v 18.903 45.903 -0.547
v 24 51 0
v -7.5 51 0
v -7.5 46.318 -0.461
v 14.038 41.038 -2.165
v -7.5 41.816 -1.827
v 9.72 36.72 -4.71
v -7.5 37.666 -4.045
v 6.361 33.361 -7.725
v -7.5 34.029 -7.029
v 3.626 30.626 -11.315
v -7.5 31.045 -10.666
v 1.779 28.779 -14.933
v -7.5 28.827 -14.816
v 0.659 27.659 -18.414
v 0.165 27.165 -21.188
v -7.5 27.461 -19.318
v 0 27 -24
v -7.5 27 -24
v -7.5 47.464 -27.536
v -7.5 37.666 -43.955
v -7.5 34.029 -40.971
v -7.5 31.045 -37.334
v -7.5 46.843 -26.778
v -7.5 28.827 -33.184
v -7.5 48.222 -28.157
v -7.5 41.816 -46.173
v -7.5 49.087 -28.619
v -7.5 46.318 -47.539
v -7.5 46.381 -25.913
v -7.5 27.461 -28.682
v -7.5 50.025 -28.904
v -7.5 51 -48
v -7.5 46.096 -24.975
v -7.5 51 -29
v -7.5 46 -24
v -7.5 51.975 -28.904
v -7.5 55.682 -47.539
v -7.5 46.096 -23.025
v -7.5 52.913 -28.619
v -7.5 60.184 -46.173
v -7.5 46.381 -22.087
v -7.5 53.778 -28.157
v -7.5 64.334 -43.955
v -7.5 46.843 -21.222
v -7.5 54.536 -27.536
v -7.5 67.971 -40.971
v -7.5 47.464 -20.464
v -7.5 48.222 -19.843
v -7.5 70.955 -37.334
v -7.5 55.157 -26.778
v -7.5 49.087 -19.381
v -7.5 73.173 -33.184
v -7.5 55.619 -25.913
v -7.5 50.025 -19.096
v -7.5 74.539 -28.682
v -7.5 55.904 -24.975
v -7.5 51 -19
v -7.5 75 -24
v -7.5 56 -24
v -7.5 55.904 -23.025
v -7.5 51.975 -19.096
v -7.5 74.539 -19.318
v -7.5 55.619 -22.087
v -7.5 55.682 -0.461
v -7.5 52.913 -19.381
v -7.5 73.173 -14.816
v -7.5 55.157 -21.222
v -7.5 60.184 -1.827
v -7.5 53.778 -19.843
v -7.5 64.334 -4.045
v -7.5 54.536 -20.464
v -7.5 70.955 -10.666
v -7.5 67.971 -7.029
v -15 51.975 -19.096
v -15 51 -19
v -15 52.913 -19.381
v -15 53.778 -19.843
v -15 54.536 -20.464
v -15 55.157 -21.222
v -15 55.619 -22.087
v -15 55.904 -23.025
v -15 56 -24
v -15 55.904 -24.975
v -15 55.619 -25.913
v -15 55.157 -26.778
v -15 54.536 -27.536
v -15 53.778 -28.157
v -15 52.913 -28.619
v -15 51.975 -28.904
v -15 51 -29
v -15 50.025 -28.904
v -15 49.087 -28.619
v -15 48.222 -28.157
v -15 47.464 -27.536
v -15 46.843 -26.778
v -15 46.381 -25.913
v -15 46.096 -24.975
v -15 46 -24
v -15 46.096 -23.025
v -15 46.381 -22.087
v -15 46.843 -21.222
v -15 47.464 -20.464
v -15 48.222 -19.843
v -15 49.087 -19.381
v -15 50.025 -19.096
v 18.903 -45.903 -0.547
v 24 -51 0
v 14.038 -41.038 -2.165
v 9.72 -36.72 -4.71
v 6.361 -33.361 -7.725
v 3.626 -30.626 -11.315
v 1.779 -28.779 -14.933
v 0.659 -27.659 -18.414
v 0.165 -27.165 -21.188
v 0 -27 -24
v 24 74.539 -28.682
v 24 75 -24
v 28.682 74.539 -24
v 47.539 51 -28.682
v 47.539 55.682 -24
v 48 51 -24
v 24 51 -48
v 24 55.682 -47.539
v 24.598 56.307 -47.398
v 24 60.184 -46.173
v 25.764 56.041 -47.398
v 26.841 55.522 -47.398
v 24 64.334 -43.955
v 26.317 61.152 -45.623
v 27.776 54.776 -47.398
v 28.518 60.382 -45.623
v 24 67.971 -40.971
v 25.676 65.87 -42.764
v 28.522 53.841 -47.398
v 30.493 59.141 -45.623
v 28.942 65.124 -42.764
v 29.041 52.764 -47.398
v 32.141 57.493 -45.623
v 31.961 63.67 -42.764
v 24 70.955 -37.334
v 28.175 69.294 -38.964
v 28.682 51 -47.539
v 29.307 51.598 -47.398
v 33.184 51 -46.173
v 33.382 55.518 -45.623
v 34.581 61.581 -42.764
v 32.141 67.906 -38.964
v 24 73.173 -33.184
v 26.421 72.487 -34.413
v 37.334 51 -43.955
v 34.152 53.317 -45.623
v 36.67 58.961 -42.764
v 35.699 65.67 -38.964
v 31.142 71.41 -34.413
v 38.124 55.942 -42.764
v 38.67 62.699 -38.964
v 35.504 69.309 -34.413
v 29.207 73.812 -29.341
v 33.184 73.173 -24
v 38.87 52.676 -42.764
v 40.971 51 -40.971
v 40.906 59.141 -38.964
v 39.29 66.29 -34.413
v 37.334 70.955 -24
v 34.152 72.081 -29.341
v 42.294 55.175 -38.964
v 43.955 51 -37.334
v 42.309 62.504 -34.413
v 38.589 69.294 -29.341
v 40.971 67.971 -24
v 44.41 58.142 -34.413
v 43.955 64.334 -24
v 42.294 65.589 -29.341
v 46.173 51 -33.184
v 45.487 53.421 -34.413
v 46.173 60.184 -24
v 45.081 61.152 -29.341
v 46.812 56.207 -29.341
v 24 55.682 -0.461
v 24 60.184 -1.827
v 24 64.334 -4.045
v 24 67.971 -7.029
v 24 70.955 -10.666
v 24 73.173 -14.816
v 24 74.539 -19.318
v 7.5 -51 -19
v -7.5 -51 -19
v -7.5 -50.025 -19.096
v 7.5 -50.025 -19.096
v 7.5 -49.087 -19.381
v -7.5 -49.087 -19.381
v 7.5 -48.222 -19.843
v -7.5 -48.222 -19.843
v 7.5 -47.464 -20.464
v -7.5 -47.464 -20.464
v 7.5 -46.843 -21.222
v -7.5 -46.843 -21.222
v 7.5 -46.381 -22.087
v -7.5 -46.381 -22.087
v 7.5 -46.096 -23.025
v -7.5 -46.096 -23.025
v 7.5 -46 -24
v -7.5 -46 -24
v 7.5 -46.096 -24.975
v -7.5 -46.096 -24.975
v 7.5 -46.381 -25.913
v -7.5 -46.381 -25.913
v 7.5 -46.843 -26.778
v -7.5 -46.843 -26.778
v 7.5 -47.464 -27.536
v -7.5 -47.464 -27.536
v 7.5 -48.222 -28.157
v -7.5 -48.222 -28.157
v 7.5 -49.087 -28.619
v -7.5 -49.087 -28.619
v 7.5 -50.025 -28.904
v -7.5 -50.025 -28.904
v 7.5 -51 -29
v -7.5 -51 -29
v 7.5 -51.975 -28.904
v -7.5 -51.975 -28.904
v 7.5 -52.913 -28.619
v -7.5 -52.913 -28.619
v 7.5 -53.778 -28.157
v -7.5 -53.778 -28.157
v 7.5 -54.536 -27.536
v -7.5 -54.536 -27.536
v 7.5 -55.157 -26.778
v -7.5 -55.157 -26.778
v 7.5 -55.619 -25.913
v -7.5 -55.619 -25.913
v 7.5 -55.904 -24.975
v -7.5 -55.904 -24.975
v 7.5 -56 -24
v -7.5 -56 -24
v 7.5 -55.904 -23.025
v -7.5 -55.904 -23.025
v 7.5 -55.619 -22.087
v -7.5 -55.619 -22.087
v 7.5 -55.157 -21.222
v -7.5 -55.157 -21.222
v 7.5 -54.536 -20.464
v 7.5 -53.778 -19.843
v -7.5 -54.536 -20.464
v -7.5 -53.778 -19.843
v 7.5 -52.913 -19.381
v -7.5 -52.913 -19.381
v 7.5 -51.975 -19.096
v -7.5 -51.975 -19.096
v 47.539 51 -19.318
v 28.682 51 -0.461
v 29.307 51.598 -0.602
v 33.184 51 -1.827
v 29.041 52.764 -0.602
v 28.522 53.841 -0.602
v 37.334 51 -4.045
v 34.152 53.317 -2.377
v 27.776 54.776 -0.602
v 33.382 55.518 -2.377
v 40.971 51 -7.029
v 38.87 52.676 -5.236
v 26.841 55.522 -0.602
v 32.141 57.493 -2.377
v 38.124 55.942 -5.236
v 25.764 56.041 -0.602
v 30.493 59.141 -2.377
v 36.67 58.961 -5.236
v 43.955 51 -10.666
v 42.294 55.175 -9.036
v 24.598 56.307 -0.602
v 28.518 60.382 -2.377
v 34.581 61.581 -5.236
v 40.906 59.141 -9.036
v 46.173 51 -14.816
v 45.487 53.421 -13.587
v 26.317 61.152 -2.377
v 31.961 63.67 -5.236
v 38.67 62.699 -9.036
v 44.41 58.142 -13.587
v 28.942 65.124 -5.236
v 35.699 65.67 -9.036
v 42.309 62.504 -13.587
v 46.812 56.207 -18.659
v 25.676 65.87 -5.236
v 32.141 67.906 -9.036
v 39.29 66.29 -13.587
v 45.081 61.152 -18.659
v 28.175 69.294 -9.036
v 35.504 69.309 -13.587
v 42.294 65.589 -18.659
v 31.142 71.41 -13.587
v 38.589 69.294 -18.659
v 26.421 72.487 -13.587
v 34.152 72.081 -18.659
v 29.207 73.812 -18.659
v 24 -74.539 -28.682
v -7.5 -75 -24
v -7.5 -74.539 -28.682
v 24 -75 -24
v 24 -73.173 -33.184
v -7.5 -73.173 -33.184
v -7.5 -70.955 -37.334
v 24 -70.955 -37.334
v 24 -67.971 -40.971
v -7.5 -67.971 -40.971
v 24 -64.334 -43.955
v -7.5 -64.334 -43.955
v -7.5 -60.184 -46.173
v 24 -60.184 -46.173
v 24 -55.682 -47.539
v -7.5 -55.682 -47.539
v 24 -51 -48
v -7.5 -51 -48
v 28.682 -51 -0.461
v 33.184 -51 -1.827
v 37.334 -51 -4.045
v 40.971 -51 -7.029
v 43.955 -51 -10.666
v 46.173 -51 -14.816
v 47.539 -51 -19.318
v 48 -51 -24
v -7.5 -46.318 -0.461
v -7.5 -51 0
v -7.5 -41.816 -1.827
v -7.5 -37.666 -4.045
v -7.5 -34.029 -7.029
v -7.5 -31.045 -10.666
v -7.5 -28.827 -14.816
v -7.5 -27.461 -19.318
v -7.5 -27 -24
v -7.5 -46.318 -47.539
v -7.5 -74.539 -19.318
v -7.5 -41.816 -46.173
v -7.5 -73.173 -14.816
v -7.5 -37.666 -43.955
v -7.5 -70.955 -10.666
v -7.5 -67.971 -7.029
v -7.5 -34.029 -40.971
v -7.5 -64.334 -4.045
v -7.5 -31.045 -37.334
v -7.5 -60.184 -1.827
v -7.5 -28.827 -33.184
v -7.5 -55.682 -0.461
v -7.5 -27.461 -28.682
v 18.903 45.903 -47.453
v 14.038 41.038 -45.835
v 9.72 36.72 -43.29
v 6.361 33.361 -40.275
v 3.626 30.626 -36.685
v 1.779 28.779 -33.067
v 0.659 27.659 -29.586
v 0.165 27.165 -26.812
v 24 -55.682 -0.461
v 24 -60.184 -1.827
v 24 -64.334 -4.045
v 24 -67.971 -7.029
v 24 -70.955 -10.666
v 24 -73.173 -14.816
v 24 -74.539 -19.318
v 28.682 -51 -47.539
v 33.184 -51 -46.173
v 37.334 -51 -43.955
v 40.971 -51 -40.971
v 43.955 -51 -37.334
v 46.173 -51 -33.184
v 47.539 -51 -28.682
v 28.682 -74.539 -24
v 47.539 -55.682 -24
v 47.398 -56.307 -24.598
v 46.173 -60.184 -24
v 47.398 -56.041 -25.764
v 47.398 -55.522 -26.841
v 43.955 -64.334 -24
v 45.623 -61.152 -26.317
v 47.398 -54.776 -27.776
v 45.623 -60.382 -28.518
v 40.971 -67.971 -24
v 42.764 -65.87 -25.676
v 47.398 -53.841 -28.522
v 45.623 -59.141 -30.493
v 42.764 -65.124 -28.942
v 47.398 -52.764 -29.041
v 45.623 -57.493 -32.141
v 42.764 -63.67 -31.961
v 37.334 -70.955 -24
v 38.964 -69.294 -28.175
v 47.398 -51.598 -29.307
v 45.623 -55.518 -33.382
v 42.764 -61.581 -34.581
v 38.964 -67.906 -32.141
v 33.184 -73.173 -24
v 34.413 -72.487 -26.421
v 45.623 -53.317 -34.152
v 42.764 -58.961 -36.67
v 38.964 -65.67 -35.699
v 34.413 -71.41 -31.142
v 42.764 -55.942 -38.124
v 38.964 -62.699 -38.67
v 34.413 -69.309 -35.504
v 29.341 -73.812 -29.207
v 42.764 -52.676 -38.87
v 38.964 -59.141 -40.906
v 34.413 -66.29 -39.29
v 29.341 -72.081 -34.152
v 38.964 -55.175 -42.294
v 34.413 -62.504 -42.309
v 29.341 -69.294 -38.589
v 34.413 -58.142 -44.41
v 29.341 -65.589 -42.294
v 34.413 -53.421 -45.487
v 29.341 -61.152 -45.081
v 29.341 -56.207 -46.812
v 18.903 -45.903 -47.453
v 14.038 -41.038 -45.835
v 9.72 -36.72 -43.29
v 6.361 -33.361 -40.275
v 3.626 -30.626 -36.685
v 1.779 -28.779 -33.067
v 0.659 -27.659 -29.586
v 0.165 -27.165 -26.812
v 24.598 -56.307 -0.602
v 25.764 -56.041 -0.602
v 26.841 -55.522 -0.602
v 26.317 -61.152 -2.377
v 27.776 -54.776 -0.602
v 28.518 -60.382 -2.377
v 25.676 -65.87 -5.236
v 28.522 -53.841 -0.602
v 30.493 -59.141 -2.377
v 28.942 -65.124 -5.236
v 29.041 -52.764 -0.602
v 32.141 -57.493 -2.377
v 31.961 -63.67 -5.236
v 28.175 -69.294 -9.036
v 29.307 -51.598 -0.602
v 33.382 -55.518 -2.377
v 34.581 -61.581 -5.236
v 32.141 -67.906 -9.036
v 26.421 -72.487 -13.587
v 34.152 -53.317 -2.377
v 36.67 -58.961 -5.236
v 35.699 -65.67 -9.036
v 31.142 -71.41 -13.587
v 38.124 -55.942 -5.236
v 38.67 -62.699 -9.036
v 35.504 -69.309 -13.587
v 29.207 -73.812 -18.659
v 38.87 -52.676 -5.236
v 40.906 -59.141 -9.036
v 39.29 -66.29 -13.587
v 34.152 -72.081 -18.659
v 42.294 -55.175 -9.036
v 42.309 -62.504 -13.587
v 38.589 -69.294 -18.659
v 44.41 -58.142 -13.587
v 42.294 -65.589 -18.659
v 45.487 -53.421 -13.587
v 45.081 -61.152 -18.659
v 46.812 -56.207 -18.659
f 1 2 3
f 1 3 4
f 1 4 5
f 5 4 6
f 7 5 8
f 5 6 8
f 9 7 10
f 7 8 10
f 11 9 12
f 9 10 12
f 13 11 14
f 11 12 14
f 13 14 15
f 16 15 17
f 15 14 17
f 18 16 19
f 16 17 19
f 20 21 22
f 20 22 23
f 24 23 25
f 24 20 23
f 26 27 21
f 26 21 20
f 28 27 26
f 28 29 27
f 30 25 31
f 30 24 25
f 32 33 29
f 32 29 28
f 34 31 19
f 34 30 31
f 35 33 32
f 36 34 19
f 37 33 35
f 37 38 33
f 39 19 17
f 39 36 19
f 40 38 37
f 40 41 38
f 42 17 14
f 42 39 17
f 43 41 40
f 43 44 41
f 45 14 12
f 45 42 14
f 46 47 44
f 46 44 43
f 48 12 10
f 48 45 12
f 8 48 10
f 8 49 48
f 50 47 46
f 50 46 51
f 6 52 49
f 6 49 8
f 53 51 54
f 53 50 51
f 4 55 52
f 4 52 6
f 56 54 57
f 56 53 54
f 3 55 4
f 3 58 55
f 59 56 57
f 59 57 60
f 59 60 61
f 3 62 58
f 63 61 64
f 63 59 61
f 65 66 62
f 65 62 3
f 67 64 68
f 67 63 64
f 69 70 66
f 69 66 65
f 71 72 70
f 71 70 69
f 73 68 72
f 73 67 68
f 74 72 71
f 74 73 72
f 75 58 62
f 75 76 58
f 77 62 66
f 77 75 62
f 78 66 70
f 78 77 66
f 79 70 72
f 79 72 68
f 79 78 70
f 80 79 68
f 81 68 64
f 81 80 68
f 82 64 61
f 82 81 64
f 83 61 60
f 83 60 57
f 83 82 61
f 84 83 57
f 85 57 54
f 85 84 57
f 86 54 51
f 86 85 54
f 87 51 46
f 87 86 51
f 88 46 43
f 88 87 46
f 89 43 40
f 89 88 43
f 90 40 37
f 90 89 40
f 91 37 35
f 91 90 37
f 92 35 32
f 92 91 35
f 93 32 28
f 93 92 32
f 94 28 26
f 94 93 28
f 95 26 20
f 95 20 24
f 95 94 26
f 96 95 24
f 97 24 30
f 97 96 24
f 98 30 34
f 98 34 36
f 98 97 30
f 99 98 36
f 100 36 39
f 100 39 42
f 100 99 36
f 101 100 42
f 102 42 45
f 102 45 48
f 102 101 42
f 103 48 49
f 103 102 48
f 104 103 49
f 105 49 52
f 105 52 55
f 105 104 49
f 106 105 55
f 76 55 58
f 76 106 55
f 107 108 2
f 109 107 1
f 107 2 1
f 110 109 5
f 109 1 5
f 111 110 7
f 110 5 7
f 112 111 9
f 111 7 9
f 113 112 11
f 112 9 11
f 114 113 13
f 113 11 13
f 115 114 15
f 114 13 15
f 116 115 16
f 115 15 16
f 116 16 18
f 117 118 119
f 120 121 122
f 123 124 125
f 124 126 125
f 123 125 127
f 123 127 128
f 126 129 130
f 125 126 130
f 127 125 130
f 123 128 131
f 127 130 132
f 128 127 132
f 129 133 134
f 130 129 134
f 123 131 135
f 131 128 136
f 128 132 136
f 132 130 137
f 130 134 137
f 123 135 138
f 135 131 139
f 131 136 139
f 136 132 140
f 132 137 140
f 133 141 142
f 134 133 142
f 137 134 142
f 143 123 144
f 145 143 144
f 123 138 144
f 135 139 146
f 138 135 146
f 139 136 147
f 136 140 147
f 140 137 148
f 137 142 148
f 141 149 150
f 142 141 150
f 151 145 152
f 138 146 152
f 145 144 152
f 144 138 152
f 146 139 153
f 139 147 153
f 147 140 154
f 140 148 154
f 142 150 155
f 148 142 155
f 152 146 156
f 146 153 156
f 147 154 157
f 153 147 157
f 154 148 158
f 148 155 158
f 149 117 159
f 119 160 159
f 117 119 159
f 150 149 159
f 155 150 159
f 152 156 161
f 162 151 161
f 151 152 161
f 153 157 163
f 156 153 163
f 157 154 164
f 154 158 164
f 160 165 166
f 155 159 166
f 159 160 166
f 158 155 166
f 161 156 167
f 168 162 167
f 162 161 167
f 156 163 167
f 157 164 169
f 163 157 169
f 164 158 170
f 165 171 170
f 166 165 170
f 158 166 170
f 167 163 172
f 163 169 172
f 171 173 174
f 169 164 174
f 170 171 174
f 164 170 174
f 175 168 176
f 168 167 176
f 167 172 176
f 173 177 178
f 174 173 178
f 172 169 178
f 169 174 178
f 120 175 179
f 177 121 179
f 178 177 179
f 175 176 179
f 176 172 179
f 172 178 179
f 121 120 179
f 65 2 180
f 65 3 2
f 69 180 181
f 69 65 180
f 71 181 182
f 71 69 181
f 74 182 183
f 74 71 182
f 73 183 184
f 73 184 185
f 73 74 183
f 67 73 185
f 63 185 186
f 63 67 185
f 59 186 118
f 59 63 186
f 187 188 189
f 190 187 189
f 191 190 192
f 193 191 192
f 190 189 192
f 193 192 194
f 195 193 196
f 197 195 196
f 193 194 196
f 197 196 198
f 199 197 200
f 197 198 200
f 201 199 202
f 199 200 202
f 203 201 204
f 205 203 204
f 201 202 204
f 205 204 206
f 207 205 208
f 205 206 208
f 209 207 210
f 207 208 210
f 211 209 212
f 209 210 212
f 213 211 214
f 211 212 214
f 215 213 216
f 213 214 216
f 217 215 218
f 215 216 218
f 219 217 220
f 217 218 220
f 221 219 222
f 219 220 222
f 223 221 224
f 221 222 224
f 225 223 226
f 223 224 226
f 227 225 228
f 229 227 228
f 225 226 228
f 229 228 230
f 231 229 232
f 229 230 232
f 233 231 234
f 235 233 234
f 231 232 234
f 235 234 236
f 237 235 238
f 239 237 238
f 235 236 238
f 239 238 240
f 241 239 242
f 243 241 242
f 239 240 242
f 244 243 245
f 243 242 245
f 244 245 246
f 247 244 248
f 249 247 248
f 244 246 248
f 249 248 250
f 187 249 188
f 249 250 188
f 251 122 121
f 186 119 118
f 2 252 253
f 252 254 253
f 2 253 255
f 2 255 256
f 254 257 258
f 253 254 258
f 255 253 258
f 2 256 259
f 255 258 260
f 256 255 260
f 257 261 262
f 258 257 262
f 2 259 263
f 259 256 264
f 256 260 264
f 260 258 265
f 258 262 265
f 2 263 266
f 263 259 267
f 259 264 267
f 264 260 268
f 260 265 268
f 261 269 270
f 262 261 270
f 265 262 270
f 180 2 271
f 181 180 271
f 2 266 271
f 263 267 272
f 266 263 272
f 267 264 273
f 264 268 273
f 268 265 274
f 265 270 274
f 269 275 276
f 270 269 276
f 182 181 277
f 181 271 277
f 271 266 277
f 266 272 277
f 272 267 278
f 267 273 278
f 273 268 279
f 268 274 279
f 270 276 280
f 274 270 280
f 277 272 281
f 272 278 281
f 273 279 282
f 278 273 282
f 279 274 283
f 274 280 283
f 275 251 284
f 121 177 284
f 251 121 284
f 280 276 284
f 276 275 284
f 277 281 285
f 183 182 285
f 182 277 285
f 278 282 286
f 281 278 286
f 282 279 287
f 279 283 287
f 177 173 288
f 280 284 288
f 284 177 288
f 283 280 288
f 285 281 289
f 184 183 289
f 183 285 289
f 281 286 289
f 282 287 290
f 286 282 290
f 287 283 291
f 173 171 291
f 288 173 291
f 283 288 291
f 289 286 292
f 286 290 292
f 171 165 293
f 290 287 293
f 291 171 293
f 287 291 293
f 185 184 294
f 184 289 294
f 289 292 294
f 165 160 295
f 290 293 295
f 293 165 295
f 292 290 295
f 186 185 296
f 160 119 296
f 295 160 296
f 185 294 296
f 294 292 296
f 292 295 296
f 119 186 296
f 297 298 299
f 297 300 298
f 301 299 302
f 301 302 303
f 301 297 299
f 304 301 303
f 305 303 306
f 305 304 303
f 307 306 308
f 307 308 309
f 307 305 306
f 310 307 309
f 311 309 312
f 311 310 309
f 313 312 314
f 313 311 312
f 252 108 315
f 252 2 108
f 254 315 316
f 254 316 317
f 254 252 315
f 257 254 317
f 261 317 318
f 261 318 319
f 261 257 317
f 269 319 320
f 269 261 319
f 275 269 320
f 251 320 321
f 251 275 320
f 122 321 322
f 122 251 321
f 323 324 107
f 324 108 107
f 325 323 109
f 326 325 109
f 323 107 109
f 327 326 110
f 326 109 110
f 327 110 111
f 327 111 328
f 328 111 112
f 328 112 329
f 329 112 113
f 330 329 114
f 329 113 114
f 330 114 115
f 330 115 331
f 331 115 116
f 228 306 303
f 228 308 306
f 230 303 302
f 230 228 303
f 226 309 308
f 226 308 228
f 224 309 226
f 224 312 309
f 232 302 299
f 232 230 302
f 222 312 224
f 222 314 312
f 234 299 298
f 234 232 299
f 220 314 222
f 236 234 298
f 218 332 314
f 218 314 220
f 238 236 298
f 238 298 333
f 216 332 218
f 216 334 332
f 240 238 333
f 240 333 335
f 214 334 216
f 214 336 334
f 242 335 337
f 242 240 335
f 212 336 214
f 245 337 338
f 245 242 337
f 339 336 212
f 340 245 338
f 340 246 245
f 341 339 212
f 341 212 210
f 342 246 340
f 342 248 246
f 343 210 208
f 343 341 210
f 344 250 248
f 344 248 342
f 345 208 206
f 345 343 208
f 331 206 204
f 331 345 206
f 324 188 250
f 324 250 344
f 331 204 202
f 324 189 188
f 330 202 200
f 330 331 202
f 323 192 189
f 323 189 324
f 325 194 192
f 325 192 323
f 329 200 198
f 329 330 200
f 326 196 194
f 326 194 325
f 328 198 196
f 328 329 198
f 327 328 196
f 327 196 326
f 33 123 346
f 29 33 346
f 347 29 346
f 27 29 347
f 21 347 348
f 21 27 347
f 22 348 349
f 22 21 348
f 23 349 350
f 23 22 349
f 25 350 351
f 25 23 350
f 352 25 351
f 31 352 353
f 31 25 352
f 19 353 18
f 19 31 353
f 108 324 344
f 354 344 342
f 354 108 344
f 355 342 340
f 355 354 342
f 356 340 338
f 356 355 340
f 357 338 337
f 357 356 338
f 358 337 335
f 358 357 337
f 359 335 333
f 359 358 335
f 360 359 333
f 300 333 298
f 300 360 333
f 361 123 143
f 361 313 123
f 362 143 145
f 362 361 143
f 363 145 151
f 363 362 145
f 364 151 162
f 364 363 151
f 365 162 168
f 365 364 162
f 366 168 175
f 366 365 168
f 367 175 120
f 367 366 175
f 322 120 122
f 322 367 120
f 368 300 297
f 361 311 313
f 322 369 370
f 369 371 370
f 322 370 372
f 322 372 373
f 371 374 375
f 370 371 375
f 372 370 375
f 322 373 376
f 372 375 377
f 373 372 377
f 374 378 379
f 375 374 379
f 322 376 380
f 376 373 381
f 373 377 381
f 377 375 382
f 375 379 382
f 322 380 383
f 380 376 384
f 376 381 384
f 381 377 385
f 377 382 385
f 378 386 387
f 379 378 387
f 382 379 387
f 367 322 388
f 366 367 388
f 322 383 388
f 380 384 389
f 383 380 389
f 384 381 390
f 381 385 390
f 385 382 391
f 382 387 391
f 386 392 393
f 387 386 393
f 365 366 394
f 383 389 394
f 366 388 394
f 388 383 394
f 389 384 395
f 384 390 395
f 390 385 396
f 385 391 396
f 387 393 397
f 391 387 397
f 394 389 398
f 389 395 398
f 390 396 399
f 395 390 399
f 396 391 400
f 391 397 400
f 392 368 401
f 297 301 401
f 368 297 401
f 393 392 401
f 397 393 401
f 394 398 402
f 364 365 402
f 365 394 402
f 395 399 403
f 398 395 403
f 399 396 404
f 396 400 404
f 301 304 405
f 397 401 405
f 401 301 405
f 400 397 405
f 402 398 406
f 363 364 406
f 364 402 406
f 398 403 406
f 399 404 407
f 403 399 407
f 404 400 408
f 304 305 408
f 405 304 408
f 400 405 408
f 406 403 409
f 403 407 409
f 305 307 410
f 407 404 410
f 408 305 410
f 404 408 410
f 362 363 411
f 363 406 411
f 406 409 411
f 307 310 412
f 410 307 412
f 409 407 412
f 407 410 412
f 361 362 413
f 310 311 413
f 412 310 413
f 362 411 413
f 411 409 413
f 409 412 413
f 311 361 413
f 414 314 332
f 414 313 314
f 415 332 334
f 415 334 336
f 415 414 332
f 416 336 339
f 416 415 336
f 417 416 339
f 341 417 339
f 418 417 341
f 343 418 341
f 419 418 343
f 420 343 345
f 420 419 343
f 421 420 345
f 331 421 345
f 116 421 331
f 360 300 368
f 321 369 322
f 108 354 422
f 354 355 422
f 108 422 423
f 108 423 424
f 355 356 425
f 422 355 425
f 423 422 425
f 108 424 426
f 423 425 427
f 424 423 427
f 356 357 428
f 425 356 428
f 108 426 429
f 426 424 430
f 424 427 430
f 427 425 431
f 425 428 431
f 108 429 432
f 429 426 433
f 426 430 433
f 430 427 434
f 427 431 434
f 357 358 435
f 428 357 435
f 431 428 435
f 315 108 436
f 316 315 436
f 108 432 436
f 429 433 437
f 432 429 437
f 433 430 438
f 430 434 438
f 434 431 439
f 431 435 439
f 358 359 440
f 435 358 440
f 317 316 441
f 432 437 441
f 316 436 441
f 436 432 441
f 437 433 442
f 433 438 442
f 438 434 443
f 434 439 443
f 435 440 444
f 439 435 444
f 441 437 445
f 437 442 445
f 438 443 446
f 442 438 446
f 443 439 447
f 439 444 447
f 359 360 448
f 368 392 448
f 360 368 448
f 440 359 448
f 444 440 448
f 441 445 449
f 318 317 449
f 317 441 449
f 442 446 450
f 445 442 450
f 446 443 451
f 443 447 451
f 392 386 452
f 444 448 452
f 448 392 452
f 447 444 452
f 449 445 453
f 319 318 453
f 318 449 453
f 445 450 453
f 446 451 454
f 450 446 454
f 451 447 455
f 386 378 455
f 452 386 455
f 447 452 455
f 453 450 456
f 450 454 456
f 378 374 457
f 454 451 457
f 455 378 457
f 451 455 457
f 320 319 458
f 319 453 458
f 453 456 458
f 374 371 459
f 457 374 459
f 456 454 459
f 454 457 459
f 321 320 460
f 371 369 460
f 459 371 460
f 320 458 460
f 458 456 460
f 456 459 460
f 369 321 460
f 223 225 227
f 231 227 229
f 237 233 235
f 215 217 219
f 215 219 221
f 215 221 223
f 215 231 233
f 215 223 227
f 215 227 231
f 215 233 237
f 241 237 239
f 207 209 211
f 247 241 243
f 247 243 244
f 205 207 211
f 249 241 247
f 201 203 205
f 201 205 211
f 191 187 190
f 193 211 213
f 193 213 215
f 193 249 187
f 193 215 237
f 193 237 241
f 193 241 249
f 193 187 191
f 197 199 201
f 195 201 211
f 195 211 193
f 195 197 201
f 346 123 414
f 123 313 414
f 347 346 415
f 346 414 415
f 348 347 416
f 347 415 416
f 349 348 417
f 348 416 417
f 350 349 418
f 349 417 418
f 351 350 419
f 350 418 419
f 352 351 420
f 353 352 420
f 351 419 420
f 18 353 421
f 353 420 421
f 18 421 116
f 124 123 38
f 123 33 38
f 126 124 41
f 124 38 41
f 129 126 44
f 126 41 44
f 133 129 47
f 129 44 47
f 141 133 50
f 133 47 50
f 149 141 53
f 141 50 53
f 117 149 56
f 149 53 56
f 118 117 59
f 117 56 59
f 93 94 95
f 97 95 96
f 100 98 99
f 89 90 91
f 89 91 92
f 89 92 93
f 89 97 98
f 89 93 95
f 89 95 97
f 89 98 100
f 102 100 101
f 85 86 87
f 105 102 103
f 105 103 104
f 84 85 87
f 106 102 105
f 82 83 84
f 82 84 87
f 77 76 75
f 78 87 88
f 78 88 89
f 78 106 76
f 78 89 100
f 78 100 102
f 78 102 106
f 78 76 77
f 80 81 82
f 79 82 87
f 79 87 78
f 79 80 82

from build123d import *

# Parameters (mm, degrees)
SKETCH1_W           = 48
SKETCH1_H           = 48
BOSS_EXTRUDE1_DEPTH = 75
SKETCH2_W           = 48
SKETCH2_H           = 48
BOSS_EXTRUDE2_DEPTH = 7.5
FILLET1_R           = 24
SKETCH3_R           = 5
CUT_EXTRUDE1_DEPTH  = 15
SKETCH4_R           = 5
BOSS_EXTRUDE3_DEPTH = 7.5


with BuildPart() as part:
    # Sketch1 → Boss-Extrude1 (new, symmetric)
    with BuildSketch(Plane(origin=(0, 0, 0), x_dir=(1, 0, 0), z_dir=(0, 1, 0))):
        with Locations((24, 24)):
            Rectangle(SKETCH1_W, SKETCH1_H)
    extrude(amount=BOSS_EXTRUDE1_DEPTH, both=True)

    # Sketch2 → Boss-Extrude2 (add, symmetric)
    with BuildSketch(Plane.ZY):
        with Locations((-24, 51)):
            Rectangle(SKETCH2_W, SKETCH2_H)
        with Locations((-24, -51)):
            Rectangle(SKETCH2_W, SKETCH2_H)
    extrude(amount=BOSS_EXTRUDE2_DEPTH, both=True)

    # Fillet1
    fillet1_edges = [part.edges().sort_by_distance(p)[0] for p in [
        (48, 75, -24),
        (0, 0, -48),
        (20.25, 75, -48),
        (0, 0, 0),
        (-3.75, 27, -48),
        (-3.75, 27, 0),
        (-3.75, -27, 0),
        (-3.75, -27, -48),
        (20.25, -75, -48),
        (48, -75, -24),
        (20.25, -75, 0),
        (48, 0, -48),
        (48, 0, 0),
        (20.25, 75, 0),
    ]]
    fillet(fillet1_edges, radius=FILLET1_R - 0.0001)  # a hair under: the kernel refuses the full size

    # Sketch3 → Cut-Extrude1 (cut)
    with BuildSketch(Plane.ZY.offset(7.5)):
        with Locations((-24, -51)):
            Circle(SKETCH3_R)
    extrude(amount=-CUT_EXTRUDE1_DEPTH, mode=Mode.SUBTRACT)

    # Sketch4 → Boss-Extrude3 (add, symmetric)
    with BuildSketch(Plane.ZY.offset(7.5)):
        with Locations((-24, 51)):
            Circle(SKETCH4_R)
    extrude(amount=BOSS_EXTRUDE3_DEPTH, both=True)


solid = part.part
